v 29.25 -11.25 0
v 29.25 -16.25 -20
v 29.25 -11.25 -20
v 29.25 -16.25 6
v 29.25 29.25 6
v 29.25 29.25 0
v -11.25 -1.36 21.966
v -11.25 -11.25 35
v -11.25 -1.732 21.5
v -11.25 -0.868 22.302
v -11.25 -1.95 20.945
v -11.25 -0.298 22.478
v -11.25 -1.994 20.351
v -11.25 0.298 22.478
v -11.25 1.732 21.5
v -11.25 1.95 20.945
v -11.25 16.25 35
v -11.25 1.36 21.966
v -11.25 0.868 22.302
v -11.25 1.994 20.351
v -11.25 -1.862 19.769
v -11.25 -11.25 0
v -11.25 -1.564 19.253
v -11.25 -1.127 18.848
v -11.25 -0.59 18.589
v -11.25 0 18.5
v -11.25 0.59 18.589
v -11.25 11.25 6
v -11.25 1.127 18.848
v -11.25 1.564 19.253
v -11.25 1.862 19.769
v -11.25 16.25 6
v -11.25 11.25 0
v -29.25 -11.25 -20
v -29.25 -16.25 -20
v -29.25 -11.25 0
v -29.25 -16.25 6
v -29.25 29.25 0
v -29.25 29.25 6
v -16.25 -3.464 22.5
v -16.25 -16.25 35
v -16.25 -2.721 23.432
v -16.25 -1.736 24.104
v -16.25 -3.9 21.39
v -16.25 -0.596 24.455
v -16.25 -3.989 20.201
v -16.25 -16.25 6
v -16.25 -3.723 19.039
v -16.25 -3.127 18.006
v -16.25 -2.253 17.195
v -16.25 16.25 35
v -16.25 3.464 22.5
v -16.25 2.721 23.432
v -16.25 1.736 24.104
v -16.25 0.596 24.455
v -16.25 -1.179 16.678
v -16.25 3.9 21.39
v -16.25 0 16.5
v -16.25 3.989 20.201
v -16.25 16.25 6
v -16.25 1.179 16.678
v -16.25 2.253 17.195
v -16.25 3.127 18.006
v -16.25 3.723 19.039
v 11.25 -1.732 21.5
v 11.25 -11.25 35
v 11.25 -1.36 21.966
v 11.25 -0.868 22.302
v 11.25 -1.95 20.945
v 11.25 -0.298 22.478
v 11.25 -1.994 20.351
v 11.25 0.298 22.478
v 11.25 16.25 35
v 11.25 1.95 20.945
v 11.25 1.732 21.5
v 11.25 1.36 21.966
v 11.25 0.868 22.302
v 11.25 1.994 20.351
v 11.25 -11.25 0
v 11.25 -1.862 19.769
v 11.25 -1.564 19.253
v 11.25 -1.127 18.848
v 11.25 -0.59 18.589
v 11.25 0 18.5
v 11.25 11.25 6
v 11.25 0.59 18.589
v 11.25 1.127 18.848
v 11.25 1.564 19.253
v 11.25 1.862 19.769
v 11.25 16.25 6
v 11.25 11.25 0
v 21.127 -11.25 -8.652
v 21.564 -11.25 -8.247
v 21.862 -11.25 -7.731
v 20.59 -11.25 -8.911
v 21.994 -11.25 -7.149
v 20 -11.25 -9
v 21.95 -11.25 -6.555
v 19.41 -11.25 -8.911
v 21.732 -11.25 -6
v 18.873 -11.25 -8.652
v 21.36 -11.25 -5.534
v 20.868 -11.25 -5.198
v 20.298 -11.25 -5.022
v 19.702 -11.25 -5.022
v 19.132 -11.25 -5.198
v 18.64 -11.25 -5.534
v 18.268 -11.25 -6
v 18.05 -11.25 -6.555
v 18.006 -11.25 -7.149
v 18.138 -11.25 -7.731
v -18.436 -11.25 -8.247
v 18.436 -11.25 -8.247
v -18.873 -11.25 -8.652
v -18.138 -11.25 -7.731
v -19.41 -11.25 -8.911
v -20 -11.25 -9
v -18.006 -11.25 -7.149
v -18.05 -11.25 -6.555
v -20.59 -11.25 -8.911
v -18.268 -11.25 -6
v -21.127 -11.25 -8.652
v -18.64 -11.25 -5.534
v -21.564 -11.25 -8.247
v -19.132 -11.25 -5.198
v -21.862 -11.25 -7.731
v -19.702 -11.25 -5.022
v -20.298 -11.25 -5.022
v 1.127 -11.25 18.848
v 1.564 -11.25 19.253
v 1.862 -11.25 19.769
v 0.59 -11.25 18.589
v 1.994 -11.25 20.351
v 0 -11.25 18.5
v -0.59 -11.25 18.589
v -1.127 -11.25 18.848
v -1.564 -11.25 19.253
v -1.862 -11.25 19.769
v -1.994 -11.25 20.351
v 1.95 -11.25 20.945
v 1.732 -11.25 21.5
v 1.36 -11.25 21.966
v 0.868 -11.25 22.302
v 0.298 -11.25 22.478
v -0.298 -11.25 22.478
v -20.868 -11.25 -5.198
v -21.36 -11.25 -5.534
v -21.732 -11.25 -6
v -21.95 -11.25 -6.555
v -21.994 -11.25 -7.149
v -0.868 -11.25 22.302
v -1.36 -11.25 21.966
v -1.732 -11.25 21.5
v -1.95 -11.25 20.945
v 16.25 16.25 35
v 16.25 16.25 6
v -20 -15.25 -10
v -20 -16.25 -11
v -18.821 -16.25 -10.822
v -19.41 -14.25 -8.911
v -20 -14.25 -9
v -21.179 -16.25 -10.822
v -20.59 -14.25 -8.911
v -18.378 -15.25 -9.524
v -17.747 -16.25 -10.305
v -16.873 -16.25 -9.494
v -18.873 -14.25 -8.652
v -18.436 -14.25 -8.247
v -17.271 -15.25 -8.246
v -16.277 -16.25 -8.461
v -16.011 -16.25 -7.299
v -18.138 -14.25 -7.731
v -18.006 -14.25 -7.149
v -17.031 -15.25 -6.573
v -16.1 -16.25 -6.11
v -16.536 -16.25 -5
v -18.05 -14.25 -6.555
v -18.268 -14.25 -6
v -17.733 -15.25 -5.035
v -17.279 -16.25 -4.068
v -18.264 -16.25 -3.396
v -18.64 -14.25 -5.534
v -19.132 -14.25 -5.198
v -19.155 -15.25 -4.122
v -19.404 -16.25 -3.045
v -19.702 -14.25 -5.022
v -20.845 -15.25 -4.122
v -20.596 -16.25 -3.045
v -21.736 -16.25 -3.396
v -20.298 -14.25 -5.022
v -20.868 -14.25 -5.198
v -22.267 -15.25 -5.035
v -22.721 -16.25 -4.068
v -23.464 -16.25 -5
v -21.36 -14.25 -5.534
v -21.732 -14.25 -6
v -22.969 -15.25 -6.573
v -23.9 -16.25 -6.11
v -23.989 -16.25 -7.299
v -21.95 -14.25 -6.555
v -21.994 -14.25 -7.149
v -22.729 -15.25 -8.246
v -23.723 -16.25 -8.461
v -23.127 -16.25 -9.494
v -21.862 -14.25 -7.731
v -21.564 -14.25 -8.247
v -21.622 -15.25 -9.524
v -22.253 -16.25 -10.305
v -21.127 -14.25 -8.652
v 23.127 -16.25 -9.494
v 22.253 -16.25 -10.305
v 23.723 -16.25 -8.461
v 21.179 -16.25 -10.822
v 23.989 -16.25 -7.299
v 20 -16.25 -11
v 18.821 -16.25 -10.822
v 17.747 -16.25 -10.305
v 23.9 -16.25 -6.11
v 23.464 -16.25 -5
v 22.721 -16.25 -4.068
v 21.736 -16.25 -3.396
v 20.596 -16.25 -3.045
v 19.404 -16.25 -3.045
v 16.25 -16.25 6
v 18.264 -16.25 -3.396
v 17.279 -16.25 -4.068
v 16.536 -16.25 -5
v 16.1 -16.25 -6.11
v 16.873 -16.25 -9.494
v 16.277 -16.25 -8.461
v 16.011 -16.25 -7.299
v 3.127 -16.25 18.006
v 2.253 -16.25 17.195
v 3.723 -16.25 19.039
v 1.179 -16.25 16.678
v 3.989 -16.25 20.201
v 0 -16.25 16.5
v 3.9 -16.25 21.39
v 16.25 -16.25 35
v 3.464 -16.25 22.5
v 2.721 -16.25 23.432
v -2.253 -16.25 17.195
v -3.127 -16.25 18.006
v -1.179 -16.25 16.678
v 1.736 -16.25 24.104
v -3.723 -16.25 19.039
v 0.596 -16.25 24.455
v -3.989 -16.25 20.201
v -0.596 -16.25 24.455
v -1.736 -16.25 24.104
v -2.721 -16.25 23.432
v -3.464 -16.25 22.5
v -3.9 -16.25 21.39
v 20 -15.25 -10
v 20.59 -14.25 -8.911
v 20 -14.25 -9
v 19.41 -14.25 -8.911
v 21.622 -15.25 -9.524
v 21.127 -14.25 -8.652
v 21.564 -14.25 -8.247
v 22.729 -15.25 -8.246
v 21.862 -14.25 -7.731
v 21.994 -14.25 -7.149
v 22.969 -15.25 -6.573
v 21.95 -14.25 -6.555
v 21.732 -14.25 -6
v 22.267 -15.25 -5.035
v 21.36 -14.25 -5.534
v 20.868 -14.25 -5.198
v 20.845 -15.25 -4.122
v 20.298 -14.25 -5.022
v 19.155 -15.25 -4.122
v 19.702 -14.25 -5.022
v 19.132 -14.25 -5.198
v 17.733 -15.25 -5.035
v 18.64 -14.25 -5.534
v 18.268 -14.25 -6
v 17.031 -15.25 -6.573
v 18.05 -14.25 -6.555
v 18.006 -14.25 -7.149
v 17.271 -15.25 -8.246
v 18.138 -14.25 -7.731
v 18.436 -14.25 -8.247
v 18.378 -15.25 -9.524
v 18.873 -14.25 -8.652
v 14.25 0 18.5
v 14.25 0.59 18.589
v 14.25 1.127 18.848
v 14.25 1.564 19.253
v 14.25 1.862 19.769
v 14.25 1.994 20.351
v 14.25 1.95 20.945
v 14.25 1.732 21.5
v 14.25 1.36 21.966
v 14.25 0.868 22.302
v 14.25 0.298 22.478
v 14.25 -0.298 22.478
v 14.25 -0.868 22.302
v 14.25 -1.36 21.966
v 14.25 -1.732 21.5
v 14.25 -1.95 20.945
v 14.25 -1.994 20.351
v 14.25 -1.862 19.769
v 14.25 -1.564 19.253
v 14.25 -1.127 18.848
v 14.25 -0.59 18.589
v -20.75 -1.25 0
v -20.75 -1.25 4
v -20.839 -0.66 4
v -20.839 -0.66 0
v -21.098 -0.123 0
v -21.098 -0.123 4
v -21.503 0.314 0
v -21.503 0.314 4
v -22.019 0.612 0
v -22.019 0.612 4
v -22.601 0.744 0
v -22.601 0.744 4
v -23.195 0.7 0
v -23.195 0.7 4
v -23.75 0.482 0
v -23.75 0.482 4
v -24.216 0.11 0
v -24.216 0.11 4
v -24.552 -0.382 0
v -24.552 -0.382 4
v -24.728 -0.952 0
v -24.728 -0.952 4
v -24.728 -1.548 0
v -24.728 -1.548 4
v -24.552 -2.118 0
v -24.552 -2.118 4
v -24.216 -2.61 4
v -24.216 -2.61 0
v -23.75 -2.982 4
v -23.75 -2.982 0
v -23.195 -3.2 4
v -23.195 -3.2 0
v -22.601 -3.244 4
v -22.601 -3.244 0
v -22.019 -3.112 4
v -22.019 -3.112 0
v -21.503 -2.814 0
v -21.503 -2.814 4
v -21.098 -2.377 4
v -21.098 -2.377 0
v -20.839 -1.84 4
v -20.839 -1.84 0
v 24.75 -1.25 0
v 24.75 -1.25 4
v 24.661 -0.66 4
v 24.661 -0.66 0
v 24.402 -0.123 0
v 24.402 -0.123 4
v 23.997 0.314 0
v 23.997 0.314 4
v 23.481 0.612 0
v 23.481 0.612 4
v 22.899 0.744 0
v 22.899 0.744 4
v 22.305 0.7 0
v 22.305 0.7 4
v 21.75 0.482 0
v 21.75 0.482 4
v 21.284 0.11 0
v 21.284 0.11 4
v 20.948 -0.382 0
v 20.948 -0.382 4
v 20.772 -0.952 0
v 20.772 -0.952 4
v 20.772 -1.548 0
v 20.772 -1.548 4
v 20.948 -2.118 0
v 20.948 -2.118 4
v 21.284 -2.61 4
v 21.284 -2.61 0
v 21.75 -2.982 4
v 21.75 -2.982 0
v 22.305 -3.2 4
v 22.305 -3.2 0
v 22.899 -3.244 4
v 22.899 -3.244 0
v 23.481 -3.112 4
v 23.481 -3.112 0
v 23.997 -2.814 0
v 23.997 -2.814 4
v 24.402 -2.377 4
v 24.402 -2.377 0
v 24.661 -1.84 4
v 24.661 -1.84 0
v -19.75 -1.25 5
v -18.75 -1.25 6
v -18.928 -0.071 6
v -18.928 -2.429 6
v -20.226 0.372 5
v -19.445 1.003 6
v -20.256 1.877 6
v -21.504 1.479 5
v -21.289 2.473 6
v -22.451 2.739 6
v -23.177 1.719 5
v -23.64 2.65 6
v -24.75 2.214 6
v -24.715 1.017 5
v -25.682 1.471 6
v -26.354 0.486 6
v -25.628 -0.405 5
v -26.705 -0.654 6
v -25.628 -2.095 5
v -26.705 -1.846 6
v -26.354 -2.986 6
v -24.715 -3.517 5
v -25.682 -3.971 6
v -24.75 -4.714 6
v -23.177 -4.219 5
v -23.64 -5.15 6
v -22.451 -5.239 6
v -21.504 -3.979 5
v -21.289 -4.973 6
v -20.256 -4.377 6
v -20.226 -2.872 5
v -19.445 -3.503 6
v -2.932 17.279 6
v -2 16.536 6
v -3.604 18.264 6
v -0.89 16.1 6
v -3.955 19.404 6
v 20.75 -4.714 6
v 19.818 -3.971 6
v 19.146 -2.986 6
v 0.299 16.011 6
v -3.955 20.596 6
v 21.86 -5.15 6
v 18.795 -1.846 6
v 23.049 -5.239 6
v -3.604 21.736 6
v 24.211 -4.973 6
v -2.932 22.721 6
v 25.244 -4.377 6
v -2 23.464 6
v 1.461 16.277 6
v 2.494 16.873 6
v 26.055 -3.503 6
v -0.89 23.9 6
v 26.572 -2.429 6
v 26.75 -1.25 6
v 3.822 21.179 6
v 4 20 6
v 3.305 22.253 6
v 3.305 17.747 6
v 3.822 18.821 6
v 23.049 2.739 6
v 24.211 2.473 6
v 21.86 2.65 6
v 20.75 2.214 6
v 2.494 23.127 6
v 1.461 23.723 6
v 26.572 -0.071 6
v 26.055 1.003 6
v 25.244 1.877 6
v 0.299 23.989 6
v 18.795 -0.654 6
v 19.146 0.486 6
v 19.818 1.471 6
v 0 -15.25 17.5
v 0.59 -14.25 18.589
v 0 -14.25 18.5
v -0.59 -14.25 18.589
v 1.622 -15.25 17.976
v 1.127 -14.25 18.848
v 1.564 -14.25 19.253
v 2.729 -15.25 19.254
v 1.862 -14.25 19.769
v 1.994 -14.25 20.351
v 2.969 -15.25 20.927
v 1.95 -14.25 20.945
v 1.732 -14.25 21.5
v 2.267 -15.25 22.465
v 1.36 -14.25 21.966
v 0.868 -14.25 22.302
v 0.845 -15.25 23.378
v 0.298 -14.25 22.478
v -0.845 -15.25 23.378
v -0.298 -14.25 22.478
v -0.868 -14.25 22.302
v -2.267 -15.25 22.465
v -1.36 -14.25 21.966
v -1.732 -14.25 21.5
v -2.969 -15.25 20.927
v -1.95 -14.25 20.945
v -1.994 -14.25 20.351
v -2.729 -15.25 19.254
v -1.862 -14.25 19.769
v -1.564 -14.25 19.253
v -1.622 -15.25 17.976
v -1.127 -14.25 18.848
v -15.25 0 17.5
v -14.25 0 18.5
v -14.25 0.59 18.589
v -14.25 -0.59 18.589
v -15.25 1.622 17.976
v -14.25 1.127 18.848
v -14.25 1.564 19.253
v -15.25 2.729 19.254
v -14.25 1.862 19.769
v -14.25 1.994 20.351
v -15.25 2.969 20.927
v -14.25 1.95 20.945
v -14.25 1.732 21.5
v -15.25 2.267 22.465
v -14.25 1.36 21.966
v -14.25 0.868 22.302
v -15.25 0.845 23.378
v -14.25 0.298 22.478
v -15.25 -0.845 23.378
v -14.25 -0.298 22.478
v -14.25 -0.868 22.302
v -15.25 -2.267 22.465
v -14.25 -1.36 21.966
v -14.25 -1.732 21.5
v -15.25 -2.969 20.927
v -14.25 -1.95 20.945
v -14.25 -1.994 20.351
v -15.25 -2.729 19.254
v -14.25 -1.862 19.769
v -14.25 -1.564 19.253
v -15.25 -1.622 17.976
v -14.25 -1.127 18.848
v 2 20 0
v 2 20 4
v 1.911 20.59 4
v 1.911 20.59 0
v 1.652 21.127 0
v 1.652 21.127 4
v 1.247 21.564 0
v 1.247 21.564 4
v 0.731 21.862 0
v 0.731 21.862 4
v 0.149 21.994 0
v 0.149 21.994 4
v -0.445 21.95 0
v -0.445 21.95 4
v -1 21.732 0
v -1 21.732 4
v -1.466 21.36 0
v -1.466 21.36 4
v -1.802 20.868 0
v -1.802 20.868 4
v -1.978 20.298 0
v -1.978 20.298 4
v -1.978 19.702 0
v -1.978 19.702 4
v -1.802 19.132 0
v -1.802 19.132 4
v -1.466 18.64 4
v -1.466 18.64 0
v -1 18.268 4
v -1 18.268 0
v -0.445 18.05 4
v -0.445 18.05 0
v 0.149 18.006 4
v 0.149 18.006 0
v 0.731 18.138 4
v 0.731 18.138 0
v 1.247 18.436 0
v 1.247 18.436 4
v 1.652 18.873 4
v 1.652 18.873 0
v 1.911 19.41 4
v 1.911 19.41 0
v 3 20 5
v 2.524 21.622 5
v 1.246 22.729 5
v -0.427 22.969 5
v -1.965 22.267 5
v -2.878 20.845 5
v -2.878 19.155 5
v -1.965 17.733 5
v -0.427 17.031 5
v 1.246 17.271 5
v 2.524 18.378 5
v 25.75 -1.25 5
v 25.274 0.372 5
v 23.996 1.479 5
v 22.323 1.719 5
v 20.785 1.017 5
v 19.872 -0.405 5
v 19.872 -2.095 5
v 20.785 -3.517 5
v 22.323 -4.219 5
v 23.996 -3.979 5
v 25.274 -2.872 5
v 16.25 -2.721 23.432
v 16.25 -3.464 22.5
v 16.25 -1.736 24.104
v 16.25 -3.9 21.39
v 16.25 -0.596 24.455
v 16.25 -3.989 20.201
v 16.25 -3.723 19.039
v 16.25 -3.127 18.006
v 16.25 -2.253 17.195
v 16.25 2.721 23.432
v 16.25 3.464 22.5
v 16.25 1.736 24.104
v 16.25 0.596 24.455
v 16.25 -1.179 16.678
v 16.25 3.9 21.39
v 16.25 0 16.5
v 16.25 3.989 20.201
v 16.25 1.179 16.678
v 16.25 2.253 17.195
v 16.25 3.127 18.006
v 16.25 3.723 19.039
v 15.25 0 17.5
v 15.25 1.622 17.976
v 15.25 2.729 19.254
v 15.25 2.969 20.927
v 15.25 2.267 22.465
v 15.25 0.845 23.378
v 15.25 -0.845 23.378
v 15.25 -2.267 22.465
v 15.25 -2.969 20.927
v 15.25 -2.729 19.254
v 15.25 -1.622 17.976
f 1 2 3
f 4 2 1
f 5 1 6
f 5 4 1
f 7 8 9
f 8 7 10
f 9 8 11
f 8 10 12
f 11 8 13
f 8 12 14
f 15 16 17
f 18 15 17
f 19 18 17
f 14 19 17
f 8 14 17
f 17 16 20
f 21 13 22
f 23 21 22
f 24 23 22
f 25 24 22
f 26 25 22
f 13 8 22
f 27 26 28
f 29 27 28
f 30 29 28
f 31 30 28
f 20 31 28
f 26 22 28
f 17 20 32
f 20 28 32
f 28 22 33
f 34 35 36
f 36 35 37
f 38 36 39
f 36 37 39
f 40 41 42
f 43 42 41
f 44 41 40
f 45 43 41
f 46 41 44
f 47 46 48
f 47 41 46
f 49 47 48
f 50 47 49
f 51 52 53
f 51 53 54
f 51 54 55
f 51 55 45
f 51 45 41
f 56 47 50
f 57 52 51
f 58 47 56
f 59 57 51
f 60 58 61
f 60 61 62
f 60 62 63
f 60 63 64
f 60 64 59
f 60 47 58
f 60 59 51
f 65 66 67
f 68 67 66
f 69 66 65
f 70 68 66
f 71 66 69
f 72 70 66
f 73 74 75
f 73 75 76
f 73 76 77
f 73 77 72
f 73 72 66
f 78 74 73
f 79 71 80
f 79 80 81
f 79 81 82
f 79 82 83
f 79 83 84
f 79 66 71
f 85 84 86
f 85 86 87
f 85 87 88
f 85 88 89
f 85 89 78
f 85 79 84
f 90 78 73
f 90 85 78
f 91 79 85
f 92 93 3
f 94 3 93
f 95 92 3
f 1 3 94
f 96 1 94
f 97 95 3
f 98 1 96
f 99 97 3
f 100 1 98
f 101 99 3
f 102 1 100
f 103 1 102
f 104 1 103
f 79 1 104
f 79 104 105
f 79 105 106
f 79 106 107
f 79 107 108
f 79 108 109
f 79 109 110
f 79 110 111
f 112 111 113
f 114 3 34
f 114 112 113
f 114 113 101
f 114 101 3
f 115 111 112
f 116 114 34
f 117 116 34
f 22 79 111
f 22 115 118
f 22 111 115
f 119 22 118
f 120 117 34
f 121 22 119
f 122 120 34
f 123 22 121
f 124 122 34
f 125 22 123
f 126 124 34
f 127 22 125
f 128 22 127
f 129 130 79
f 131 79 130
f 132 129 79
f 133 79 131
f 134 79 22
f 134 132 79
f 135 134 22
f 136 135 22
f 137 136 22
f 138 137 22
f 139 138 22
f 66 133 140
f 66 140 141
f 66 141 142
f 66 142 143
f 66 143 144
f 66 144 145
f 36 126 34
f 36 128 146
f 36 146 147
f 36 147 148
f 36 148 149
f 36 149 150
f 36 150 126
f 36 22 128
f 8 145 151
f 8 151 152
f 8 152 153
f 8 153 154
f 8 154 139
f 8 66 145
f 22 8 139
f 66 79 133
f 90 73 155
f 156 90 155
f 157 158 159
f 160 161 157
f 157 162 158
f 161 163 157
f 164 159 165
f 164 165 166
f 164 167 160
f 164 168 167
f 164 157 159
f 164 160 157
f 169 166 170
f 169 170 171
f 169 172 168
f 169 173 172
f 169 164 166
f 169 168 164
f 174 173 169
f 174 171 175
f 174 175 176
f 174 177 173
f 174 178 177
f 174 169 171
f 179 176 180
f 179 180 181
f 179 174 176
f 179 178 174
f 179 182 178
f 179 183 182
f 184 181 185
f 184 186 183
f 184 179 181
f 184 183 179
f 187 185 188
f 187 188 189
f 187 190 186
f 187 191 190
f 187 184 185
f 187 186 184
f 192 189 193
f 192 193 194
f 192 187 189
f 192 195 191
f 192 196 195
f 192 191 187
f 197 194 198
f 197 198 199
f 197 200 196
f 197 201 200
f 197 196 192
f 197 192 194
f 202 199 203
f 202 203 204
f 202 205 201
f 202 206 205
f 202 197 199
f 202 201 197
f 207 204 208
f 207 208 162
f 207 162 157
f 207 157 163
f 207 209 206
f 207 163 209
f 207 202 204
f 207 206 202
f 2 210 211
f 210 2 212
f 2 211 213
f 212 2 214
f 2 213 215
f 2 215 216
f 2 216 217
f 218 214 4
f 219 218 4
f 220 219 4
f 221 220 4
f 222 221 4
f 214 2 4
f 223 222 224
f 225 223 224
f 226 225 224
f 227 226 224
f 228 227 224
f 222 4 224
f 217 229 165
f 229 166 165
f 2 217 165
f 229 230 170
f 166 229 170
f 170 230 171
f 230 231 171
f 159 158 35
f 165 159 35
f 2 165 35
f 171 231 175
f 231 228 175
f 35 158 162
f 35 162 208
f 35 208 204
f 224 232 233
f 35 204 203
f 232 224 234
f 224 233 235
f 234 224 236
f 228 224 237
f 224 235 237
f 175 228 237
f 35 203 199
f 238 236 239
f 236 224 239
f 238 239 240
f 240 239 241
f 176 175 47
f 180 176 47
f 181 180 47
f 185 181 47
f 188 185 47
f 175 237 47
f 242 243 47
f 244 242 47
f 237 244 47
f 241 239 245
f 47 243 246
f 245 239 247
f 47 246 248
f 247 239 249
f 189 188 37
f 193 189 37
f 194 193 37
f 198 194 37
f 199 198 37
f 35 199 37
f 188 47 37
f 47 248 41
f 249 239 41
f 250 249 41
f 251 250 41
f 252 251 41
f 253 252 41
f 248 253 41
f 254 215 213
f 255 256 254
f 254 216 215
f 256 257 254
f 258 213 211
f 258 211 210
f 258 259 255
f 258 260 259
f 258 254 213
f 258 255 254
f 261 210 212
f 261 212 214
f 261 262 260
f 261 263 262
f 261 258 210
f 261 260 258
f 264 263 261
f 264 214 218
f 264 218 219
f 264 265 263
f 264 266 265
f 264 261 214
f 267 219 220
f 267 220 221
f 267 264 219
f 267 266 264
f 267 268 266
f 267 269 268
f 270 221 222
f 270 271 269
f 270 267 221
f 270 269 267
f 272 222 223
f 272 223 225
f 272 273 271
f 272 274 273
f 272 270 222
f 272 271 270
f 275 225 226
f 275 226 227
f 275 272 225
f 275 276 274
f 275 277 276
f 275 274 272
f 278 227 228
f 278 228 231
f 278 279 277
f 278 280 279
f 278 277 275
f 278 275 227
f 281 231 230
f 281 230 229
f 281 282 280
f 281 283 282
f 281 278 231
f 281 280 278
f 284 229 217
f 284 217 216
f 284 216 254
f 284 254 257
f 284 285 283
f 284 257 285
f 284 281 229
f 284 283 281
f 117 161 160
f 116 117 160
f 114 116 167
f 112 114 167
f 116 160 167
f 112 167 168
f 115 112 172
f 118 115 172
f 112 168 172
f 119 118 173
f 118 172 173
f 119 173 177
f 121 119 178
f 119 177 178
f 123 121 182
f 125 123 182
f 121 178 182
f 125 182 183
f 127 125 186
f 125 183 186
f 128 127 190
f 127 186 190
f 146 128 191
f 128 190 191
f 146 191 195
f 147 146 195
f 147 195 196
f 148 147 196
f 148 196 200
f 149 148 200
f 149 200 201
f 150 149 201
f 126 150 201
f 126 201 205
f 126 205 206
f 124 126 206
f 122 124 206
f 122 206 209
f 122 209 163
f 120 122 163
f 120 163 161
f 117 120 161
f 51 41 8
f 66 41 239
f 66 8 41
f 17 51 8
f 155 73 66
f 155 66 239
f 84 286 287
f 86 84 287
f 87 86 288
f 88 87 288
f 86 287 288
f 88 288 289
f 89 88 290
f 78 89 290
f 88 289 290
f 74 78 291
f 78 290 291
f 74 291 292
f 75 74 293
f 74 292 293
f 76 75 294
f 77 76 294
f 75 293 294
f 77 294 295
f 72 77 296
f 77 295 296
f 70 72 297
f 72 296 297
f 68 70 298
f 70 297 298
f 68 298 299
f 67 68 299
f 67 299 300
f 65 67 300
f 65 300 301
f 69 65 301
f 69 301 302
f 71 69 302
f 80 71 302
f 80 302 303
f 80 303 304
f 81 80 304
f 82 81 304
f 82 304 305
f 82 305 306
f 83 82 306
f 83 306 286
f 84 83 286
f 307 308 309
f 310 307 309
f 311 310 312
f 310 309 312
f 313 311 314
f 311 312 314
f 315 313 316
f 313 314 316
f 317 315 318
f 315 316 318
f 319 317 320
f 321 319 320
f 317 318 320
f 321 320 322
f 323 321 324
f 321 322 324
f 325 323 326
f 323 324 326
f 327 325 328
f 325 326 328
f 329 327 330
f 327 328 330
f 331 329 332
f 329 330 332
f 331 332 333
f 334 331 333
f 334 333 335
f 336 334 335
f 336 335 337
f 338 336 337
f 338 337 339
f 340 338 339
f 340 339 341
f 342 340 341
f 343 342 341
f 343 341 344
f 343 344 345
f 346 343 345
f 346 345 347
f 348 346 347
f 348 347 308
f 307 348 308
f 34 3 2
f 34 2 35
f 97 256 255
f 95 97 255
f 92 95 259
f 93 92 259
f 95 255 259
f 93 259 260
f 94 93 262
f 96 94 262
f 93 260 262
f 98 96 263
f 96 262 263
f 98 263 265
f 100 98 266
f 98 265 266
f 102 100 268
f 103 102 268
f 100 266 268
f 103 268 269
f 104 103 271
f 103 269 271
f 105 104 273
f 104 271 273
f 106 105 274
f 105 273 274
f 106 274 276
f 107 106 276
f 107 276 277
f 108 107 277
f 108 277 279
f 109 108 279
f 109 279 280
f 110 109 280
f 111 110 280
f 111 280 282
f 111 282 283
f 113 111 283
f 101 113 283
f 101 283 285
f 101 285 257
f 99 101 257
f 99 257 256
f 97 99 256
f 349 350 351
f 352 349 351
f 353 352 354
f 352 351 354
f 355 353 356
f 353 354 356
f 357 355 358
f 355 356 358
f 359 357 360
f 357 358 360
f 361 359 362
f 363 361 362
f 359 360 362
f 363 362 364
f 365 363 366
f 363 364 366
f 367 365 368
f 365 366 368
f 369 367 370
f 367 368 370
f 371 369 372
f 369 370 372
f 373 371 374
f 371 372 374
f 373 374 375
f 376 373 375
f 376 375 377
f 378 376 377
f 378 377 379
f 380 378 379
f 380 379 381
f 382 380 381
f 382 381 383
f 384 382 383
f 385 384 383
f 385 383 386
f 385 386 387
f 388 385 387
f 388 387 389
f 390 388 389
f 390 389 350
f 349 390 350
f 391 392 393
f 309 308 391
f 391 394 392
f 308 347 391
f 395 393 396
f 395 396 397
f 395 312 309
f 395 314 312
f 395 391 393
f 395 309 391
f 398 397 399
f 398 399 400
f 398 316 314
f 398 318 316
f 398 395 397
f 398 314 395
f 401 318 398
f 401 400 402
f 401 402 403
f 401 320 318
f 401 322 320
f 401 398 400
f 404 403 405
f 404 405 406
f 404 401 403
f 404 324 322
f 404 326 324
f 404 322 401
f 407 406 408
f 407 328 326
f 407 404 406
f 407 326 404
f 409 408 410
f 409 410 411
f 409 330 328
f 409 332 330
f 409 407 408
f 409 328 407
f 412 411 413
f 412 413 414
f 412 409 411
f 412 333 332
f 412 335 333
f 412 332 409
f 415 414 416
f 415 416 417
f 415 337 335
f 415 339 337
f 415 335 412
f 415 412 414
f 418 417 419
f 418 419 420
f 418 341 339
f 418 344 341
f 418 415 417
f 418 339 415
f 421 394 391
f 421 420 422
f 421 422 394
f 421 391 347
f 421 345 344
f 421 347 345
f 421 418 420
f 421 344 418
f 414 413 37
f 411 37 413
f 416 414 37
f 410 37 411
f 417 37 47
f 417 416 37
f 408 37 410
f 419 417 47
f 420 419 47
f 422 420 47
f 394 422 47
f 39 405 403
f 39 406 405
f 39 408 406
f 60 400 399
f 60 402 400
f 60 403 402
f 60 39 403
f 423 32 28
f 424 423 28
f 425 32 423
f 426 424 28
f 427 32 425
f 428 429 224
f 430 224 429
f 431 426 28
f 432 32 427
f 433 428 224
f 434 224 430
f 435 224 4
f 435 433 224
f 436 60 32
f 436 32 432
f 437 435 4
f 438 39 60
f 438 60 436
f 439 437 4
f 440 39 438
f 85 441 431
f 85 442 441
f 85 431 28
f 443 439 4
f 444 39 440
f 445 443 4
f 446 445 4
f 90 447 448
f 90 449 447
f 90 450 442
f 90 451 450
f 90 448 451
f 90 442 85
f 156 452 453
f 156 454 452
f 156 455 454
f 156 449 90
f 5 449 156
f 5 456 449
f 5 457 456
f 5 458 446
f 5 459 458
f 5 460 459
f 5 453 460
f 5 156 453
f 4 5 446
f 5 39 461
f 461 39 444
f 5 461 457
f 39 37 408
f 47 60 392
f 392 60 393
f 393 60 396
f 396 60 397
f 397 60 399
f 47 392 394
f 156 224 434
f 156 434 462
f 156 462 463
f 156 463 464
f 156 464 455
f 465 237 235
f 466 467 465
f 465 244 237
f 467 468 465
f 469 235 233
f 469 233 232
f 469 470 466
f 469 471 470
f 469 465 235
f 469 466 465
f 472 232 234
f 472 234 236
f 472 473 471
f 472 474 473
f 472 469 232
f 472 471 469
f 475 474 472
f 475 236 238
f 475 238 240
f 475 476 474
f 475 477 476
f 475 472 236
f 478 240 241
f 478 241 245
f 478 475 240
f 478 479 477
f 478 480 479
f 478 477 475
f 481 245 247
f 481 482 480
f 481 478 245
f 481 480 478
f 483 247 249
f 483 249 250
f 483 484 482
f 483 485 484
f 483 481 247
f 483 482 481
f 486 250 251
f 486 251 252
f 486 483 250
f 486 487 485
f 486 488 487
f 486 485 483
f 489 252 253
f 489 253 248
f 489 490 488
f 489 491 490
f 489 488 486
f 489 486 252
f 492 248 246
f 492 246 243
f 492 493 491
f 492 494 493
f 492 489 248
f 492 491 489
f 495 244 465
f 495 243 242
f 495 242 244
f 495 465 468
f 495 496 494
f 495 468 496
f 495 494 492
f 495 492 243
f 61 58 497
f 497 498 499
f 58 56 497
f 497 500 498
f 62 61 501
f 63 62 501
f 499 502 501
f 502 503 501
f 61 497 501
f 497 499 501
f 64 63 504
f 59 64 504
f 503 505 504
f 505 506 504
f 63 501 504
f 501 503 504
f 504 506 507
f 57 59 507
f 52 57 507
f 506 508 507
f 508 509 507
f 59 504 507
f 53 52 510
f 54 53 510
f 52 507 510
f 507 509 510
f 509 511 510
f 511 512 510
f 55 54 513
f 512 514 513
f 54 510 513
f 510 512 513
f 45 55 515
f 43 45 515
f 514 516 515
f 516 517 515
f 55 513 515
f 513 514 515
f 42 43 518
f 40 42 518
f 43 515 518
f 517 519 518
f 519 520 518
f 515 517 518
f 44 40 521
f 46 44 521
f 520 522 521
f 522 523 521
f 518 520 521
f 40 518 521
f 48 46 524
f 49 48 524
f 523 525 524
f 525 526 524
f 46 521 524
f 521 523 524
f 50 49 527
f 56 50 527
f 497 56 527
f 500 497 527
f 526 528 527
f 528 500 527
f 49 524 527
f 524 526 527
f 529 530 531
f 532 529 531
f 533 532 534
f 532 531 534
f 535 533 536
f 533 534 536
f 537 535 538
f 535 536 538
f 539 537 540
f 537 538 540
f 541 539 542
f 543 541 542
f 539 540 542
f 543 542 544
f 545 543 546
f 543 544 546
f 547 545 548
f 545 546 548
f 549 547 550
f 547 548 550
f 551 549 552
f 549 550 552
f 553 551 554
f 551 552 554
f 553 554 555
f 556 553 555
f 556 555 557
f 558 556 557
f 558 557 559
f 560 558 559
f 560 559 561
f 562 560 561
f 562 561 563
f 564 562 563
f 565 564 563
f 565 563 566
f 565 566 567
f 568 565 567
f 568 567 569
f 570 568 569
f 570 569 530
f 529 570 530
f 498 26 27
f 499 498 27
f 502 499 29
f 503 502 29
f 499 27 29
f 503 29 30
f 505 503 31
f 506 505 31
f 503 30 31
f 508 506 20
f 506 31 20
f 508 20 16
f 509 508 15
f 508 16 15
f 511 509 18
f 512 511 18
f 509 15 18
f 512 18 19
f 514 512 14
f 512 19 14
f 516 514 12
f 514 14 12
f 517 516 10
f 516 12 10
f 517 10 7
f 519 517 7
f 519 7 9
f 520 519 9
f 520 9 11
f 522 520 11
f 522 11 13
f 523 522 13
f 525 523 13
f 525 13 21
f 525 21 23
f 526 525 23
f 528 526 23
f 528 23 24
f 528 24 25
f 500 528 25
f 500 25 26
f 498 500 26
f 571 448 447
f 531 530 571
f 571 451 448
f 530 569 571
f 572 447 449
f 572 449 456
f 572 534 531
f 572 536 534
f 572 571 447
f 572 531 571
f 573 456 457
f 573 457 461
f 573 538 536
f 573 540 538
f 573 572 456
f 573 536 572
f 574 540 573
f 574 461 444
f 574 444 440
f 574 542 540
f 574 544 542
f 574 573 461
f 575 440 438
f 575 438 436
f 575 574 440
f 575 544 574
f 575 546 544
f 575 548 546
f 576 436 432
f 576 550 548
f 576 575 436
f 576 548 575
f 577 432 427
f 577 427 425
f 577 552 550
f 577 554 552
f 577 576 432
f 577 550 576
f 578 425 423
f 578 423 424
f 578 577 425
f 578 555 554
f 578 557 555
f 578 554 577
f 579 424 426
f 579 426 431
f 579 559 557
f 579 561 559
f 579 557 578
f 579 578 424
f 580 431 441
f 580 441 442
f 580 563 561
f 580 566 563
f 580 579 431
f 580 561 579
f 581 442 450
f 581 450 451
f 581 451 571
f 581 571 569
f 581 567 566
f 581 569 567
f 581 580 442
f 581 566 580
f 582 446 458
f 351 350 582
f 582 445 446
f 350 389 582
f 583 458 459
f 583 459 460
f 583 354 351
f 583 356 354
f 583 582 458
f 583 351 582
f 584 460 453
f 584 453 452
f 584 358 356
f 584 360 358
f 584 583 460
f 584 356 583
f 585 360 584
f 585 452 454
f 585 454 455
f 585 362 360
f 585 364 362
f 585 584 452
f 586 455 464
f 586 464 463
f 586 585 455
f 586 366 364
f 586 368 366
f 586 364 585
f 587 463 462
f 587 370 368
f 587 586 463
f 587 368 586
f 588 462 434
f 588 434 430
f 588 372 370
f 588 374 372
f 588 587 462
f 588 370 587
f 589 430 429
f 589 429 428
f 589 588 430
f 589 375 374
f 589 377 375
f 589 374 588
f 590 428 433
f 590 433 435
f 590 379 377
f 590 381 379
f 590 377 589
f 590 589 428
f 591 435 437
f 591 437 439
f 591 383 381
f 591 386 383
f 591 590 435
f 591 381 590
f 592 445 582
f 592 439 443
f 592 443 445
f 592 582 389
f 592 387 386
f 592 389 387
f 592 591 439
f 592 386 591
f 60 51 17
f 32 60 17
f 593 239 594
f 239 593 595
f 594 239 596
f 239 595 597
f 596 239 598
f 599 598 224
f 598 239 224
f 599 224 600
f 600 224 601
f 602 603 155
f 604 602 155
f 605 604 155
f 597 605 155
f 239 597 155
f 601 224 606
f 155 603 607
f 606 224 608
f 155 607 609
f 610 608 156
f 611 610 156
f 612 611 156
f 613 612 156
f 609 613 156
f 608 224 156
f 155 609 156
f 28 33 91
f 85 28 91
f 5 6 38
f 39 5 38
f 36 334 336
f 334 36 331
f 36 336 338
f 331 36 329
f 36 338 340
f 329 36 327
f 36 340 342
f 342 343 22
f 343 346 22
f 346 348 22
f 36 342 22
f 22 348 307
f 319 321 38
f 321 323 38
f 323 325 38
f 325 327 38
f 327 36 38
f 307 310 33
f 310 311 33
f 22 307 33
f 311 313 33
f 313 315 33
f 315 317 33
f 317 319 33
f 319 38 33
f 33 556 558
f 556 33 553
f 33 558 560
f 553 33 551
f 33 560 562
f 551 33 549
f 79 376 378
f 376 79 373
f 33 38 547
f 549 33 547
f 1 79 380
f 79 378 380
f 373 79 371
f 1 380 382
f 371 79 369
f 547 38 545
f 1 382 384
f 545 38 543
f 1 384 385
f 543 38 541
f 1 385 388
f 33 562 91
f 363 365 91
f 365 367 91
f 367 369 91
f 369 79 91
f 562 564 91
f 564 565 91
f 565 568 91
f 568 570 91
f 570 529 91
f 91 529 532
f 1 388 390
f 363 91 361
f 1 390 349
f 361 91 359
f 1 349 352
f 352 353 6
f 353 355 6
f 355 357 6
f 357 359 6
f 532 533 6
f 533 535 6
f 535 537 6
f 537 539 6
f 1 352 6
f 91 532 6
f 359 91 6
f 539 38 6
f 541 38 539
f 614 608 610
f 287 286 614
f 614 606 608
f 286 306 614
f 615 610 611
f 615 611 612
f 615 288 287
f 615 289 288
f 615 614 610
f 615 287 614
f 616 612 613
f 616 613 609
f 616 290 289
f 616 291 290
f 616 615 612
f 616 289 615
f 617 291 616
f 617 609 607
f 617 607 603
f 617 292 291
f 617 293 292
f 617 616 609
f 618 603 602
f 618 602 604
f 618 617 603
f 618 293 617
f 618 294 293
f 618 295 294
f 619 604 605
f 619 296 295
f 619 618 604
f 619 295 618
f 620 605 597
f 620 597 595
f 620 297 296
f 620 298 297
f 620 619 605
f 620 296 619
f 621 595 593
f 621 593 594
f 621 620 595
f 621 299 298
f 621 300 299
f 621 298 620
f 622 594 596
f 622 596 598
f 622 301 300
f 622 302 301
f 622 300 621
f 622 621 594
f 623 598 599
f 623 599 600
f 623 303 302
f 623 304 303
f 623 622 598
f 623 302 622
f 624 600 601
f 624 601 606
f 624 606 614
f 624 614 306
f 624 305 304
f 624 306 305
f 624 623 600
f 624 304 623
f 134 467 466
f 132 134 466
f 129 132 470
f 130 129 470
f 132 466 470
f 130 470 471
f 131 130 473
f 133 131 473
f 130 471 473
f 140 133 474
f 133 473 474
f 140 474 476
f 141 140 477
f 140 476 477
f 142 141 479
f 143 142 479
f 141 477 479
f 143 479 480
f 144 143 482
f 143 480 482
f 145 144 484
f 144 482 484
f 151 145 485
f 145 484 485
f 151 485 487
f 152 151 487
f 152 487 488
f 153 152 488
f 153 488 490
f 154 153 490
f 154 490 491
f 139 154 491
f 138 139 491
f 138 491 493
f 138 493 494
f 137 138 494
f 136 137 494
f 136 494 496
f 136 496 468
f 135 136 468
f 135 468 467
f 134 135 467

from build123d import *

# Parameters (mm, degrees)
SKETCH1_W           = 32.5
SKETCH1_H           = 32.5
SKETCH1_W_2         = 22.5
SKETCH1_H_2         = 22.5
BOSS_EXTRUDE1_DEPTH = 35
BOSS_EXTRUDE2_DEPTH = 6
SKETCH3_R           = 2
CUT_EXTRUDE1_DEPTH  = 51.518560945
SKETCH4_W           = 22.5
SKETCH4_H           = 5
CUT_EXTRUDE2_DEPTH  = 29
SKETCH6_W           = 58.5
SKETCH6_H           = 5
BOSS_EXTRUDE3_DEPTH = 20
SKETCH5_R           = 2
CUT_EXTRUDE3_DEPTH  = 65.426799548
SKETCH7_R           = 2
CUT_EXTRUDE4_DEPTH  = 65.426799548
CHAMFER1_SIZE       = 2


with BuildPart() as part:
    # Sketch1 → Boss-Extrude1 (new body)
    with BuildSketch(Plane.XY):
        Rectangle(SKETCH1_W, SKETCH1_H)
        Rectangle(SKETCH1_W_2, SKETCH1_H_2, mode=Mode.SUBTRACT)
    extrude(amount=BOSS_EXTRUDE1_DEPTH)

    # Sketch2 → Boss-Extrude2 (add)
    with BuildSketch(Plane(origin=(0, 0, 0), x_dir=(-1, 0, 0), z_dir=(0, 0, -1))):
        Polygon((-16.25, -16.25), (-29.25, -16.25), (-29.25, 29.25), (29.25, 29.25), (29.25, -16.25), (16.25, -16.25), (16.25, 16.25), (-16.25, 16.25), align=None)
    extrude(amount=-BOSS_EXTRUDE2_DEPTH)

    # Sketch3 → Cut-Extrude1 (cut, through all)
    with BuildSketch(Plane.XY.offset(6)):
        with Locations((-22.75, -1.25)):
            Circle(SKETCH3_R)
        with Locations((0, 20)):
            Circle(SKETCH3_R)
        with Locations((22.75, -1.25)):
            Circle(SKETCH3_R)
    extrude(amount=-CUT_EXTRUDE1_DEPTH, mode=Mode.SUBTRACT)

    # Sketch4 → Cut-Extrude2 (cut)
    with BuildSketch(Plane.XY.offset(35)):
        with Locations((0, 13.75)):
            Rectangle(SKETCH4_W, SKETCH4_H)
    extrude(amount=-CUT_EXTRUDE2_DEPTH, mode=Mode.SUBTRACT)

    # Sketch6 → Boss-Extrude3 (add)
    with BuildSketch(Plane(origin=(0, 0, 0), x_dir=(-1, 0, 0), z_dir=(0, 0, -1))):
        with Locations((0, -13.75)):
            Rectangle(SKETCH6_W, SKETCH6_H)
    extrude(amount=BOSS_EXTRUDE3_DEPTH)

    # Sketch5 → Cut-Extrude3 (cut, through all)
    with BuildSketch(Plane(origin=(16.25, 0, 0), x_dir=(0, 0, -1), z_dir=(1, 0, 0))):
        with Locations((-20.5, 0)):
            Circle(SKETCH5_R)
    extrude(amount=-CUT_EXTRUDE3_DEPTH, mode=Mode.SUBTRACT)

    # Sketch7 → Cut-Extrude4 (cut, through all)
    with BuildSketch(Plane.XZ.offset(16.25)):
        with Locations(Location((-20, -7, 0), (0, 0, 270))):
            Circle(SKETCH7_R)
        with Locations(Location((20, -7, 0), (0, 0, 270))):
            Circle(SKETCH7_R)
        with Locations(Location((0, 20.5, 0), (0, 0, 270))):
            Circle(SKETCH7_R)
    extrude(amount=-CUT_EXTRUDE4_DEPTH, mode=Mode.SUBTRACT)

    # Chamfer1
    chamfer1_edges = [part.edges().sort_by_distance(p)[0] for p in [
        (-20, -16.25, -5),
        (20, -16.25, -5),
        (0, -16.25, 22.5),
        (-24.75, -1.25, 6),
        (-2, 20, 6),
        (20.75, -1.25, 6),
        (-16.25, 0, 22.5),
        (16.25, 0, 22.5),
    ]]
    chamfer(chamfer1_edges, length=CHAMFER1_SIZE)


solid = part.part
